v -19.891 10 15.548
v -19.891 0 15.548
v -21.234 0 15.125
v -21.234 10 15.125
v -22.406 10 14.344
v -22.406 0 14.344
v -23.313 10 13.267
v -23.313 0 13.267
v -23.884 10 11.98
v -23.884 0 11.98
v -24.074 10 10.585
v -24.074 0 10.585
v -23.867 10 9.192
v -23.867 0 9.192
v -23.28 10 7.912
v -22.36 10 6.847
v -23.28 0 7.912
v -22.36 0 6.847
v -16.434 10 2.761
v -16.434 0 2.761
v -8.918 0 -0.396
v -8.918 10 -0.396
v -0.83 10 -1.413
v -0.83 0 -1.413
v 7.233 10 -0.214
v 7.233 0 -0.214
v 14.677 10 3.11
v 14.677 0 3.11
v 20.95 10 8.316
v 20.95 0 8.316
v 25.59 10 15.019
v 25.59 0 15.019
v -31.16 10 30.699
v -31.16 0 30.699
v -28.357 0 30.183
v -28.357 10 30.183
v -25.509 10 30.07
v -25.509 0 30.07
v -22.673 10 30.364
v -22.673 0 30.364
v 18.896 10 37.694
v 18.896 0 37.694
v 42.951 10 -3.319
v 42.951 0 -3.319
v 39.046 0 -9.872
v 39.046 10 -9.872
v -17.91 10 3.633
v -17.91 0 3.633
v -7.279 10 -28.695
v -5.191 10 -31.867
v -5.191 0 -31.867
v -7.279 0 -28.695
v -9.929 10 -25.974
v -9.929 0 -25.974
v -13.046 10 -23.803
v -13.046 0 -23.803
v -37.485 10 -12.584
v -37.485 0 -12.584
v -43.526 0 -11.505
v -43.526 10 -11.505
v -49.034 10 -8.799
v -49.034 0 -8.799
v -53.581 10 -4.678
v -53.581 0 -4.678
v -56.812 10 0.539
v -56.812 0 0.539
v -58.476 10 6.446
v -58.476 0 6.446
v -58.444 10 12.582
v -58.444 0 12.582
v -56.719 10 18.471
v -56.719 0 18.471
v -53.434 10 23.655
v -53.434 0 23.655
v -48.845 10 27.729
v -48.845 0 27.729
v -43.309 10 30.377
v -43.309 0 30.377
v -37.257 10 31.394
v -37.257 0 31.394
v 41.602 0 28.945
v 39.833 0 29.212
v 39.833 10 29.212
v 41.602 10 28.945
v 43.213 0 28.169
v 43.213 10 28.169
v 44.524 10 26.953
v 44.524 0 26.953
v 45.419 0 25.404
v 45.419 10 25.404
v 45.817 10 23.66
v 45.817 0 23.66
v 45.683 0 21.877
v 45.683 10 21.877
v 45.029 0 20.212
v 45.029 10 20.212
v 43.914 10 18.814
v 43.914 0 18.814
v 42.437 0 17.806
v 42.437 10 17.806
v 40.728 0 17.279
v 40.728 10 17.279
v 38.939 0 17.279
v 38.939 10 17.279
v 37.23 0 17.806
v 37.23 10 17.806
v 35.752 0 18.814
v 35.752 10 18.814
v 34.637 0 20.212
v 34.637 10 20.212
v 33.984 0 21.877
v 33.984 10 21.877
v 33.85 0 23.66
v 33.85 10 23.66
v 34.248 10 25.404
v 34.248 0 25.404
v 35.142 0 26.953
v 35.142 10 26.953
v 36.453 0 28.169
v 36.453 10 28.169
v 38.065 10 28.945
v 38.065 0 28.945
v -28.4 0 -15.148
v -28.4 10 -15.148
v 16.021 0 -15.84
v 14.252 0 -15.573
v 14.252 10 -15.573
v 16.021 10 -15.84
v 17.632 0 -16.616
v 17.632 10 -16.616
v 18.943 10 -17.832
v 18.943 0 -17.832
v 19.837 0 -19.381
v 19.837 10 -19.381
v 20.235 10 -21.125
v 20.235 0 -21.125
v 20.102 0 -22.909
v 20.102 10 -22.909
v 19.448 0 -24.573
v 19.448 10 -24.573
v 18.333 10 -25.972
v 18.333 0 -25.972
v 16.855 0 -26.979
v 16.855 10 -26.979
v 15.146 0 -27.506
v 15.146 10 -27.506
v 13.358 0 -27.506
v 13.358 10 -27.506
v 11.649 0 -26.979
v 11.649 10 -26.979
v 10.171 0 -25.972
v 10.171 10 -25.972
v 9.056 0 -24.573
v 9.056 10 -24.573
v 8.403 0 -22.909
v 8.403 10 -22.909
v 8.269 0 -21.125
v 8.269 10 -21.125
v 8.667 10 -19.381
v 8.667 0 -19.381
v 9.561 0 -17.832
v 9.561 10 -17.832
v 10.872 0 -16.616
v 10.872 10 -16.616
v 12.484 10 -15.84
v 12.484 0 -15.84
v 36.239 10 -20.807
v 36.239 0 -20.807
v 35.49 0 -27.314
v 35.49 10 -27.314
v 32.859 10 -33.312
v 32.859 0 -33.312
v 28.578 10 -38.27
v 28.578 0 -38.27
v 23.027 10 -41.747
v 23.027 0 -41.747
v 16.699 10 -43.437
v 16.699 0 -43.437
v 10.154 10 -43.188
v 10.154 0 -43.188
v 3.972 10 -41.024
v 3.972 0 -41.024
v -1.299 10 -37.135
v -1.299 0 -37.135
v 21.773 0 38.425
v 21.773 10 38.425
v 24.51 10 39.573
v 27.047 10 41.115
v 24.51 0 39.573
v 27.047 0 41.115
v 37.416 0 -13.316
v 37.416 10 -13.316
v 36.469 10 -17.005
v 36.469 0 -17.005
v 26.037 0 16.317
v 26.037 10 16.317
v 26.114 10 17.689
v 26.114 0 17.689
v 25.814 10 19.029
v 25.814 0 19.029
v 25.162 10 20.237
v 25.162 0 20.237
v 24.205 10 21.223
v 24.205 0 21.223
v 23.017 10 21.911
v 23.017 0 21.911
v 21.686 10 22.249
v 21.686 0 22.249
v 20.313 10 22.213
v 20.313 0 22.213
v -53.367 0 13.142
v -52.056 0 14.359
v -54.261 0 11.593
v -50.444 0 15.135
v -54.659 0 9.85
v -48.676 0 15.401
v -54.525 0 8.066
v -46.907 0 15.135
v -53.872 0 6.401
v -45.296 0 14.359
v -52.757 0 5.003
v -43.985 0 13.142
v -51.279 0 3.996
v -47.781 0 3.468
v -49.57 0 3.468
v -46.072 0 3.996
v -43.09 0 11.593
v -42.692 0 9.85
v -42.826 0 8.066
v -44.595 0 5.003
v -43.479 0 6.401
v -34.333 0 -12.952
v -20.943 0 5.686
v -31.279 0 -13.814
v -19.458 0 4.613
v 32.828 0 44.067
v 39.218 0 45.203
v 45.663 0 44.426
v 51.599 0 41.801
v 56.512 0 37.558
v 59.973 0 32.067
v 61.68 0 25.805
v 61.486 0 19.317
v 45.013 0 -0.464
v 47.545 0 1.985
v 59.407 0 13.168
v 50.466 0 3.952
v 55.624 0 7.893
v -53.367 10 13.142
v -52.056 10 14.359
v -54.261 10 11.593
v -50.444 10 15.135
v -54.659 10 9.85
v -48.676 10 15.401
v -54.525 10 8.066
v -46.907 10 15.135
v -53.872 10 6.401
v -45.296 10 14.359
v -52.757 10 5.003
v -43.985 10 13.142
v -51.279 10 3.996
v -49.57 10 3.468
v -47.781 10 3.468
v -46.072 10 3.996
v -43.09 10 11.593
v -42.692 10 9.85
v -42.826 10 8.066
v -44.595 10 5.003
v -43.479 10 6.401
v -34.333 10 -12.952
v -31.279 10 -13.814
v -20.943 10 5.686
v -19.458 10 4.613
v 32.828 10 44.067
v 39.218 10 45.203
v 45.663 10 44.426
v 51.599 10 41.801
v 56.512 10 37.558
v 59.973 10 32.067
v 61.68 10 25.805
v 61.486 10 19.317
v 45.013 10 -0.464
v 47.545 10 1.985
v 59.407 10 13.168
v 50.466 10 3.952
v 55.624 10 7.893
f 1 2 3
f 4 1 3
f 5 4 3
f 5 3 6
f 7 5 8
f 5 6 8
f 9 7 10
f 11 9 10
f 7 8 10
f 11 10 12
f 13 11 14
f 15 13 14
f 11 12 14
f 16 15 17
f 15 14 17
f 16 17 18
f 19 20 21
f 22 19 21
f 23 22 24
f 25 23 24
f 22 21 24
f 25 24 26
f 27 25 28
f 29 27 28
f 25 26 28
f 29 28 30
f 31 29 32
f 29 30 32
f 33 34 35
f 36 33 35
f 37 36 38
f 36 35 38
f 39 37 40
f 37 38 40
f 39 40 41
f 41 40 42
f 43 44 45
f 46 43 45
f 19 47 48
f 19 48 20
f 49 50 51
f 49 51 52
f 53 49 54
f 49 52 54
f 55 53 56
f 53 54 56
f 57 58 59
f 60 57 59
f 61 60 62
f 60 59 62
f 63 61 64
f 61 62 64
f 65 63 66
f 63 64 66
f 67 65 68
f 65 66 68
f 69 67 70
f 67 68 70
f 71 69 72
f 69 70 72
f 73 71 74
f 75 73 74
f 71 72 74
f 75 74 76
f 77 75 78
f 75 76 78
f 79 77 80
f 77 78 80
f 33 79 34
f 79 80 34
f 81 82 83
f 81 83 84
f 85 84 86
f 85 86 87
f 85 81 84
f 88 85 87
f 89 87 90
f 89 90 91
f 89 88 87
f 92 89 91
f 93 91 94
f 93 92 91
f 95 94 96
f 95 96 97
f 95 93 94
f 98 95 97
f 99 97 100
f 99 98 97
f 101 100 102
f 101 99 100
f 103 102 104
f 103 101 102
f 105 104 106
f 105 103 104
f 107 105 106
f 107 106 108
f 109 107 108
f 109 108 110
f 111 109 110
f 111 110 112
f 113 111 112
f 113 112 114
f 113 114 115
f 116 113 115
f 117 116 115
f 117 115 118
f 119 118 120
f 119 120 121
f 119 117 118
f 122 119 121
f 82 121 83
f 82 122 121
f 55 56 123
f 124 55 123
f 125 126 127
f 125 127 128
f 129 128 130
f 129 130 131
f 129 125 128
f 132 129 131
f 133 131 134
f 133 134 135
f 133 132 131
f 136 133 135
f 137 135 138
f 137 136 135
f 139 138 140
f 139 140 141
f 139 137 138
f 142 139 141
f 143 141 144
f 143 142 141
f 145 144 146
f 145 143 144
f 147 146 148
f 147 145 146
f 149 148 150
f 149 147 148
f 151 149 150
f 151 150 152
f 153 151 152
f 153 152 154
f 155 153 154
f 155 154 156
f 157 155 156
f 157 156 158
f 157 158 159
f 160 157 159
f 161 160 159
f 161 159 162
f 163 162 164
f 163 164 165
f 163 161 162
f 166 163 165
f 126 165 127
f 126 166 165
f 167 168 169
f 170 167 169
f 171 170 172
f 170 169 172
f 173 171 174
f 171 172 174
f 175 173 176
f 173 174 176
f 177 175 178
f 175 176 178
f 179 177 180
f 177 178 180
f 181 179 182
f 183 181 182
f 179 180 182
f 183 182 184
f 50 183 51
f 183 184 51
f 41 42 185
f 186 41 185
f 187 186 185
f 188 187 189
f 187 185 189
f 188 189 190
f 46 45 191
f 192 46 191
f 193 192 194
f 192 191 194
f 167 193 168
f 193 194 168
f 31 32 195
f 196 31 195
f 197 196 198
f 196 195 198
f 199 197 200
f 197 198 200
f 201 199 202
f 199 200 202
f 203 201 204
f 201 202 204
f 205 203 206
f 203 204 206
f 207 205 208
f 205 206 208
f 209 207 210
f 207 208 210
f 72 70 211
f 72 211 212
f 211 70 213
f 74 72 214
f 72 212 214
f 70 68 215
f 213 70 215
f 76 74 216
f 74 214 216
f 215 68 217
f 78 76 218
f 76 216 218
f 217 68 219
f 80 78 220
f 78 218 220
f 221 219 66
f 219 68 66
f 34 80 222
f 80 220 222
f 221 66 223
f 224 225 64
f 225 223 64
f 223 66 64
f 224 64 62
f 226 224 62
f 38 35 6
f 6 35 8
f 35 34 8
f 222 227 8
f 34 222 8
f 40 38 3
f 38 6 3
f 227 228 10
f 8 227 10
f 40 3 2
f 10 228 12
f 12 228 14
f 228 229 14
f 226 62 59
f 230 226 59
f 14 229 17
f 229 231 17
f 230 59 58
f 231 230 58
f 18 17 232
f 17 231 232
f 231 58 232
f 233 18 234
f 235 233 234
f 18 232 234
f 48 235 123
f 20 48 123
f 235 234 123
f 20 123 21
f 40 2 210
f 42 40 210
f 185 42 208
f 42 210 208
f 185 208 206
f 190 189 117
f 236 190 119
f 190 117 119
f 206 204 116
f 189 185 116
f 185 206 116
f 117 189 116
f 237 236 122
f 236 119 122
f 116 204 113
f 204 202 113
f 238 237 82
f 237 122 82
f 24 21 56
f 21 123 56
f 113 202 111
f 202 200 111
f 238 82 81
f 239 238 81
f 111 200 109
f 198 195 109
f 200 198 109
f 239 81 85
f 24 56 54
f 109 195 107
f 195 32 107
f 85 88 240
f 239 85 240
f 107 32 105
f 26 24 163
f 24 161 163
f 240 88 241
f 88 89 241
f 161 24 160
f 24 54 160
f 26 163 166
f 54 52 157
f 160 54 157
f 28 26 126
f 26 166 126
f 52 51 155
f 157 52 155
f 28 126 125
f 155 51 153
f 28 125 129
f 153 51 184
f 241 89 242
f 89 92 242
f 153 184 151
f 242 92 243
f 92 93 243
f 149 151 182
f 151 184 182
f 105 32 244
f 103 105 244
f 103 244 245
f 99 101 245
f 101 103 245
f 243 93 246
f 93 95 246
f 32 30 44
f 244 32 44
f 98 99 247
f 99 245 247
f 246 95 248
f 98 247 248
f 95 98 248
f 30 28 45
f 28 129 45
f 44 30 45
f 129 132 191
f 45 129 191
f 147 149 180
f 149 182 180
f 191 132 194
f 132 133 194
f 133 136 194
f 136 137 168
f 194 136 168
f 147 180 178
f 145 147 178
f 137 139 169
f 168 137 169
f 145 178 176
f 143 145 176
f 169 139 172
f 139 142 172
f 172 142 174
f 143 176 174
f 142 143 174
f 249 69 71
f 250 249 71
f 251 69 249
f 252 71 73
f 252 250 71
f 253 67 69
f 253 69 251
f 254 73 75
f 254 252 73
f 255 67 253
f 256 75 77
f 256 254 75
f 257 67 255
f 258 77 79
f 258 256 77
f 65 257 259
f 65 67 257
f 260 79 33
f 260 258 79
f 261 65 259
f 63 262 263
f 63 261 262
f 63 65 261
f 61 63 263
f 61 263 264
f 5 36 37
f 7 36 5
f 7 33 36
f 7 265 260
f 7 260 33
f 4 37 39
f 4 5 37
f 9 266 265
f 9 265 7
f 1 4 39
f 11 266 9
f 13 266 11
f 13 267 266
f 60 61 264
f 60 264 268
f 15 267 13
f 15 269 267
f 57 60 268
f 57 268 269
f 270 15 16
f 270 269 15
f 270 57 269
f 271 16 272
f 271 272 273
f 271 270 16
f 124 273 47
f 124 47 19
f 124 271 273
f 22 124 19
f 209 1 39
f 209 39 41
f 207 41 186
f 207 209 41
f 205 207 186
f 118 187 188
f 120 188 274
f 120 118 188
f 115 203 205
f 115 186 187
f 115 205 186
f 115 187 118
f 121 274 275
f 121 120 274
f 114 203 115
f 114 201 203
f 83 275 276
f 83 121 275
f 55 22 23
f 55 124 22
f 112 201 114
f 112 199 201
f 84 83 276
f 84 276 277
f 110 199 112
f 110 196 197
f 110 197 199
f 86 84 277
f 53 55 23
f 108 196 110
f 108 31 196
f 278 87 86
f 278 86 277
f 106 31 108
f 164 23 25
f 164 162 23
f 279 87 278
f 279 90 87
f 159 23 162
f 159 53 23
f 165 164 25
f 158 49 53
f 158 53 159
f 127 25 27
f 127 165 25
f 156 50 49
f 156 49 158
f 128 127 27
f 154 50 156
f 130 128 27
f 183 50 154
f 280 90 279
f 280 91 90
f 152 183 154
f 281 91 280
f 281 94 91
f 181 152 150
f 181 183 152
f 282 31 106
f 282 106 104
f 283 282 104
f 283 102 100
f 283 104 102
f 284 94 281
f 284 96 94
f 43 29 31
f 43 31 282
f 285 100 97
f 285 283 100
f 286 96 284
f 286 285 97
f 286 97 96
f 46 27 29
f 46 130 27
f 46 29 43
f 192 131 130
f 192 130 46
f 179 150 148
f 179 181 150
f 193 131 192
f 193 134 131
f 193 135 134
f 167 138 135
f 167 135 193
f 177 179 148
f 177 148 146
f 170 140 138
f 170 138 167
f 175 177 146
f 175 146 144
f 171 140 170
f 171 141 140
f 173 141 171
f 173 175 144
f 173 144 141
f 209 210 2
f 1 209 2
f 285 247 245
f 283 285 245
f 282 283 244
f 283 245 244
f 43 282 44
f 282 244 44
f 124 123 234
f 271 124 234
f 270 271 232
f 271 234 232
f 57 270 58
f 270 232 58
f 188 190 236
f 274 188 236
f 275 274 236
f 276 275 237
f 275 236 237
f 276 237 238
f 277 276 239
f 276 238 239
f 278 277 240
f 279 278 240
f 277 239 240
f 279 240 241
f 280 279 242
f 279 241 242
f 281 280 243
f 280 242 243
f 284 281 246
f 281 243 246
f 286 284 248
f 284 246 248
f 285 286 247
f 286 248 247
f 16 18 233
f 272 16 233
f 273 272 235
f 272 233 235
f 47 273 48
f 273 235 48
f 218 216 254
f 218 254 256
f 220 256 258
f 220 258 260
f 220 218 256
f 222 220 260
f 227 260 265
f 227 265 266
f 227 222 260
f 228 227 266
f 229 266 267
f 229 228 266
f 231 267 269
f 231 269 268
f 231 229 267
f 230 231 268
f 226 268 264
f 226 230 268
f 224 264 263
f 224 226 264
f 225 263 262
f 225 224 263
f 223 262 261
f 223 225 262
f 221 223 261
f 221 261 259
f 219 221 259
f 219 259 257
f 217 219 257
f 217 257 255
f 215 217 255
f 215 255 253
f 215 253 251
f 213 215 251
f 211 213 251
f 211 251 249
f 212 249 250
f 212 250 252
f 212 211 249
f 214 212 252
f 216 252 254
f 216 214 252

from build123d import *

# Parameters (mm, degrees)
SKETCH1_R           = 6
BOSS_EXTRUDE1_DEPTH = 10


with BuildPart() as part:
    # Sketch1 → Boss-Extrude1 (new body)
    with BuildSketch(Plane(origin=(0, 0, 0), x_dir=(1, 0, 0), z_dir=(0, 1, 0))):
        with BuildLine():
            Line((42.951232399, 3.318887452), (39.045860783, 9.872476959))
            ThreePointArc((39.045860783, 9.872476959), (36.854758208, 15.13768422), (36.238749427, 20.807240744))
            ThreePointArc((36.238749427, 20.807240744), (19.926498256, 42.82902865), (-5.191028063, 31.867342993))
            ThreePointArc((-5.191028063, 31.867342993), (-8.539203816, 27.271038576), (-13.045616394, 23.802819891))
            Line((-13.045616394, 23.802819891), (-28.400215901, 15.147576948))
            ThreePointArc((-28.400215901, 15.147576948), (-32.789279464, 13.321988508), (-37.485200727, 12.583763884))
            ThreePointArc((-37.485200727, 12.583763884), (-58.444412115, -12.582400357), (-31.160339611, -30.698794925))
            ThreePointArc((-31.160339611, -30.698794925), (-26.9348971, -30.075669304), (-22.673496589, -30.363967139))
            Line((-22.673496589, -30.363967139), (18.895945155, -37.693778855))
            ThreePointArc((18.895945155, -37.693778855), (23.162809039, -38.948266928), (27.046941071, -41.114689344))
            ThreePointArc((27.046941071, -41.114689344), (58.445846615, -34.941068913), (50.465944263, -3.951941513))
            ThreePointArc((50.465944263, -3.951941513), (46.22501506, -0.816320632), (42.951232399, 3.318887452))
        make_face()
        with Locations(Location((-48.675608258, -9.401334707, 0), (0, 0, 270))):
            Circle(SKETCH1_R, mode=Mode.SUBTRACT)
        with Locations(Location((14.252094878, 21.573414185, 0), (0, 0, 270))):
            Circle(SKETCH1_R, mode=Mode.SUBTRACT)
        with Locations(Location((39.833295256, -23.211920099, 0), (0, 0, 270))):
            Circle(SKETCH1_R, mode=Mode.SUBTRACT)
        with BuildLine():
            Line((20.312704962, -22.212607301), (-19.891412958, -15.548077687))
            ThreePointArc((-19.891412958, -15.548077687), (-23.883928025, -11.979955979), (-22.359792068, -6.846859578))
            ThreePointArc((-22.359792068, -6.846859578), (-20.208737863, -5.13808357), (-17.910389919, -3.633242594))
            Line((-17.910389919, -3.633242594), (-16.434238636, -2.760580859))
            ThreePointArc((-16.434238636, -2.760580859), (7.233462597, 0.214394926), (25.58991918, -15.018827461))
            ThreePointArc((25.58991918, -15.018827461), (25.161933747, -20.2373856), (20.312704962, -22.212607301))
        make_face(mode=Mode.SUBTRACT)
    extrude(amount=BOSS_EXTRUDE1_DEPTH)


solid = part.part
